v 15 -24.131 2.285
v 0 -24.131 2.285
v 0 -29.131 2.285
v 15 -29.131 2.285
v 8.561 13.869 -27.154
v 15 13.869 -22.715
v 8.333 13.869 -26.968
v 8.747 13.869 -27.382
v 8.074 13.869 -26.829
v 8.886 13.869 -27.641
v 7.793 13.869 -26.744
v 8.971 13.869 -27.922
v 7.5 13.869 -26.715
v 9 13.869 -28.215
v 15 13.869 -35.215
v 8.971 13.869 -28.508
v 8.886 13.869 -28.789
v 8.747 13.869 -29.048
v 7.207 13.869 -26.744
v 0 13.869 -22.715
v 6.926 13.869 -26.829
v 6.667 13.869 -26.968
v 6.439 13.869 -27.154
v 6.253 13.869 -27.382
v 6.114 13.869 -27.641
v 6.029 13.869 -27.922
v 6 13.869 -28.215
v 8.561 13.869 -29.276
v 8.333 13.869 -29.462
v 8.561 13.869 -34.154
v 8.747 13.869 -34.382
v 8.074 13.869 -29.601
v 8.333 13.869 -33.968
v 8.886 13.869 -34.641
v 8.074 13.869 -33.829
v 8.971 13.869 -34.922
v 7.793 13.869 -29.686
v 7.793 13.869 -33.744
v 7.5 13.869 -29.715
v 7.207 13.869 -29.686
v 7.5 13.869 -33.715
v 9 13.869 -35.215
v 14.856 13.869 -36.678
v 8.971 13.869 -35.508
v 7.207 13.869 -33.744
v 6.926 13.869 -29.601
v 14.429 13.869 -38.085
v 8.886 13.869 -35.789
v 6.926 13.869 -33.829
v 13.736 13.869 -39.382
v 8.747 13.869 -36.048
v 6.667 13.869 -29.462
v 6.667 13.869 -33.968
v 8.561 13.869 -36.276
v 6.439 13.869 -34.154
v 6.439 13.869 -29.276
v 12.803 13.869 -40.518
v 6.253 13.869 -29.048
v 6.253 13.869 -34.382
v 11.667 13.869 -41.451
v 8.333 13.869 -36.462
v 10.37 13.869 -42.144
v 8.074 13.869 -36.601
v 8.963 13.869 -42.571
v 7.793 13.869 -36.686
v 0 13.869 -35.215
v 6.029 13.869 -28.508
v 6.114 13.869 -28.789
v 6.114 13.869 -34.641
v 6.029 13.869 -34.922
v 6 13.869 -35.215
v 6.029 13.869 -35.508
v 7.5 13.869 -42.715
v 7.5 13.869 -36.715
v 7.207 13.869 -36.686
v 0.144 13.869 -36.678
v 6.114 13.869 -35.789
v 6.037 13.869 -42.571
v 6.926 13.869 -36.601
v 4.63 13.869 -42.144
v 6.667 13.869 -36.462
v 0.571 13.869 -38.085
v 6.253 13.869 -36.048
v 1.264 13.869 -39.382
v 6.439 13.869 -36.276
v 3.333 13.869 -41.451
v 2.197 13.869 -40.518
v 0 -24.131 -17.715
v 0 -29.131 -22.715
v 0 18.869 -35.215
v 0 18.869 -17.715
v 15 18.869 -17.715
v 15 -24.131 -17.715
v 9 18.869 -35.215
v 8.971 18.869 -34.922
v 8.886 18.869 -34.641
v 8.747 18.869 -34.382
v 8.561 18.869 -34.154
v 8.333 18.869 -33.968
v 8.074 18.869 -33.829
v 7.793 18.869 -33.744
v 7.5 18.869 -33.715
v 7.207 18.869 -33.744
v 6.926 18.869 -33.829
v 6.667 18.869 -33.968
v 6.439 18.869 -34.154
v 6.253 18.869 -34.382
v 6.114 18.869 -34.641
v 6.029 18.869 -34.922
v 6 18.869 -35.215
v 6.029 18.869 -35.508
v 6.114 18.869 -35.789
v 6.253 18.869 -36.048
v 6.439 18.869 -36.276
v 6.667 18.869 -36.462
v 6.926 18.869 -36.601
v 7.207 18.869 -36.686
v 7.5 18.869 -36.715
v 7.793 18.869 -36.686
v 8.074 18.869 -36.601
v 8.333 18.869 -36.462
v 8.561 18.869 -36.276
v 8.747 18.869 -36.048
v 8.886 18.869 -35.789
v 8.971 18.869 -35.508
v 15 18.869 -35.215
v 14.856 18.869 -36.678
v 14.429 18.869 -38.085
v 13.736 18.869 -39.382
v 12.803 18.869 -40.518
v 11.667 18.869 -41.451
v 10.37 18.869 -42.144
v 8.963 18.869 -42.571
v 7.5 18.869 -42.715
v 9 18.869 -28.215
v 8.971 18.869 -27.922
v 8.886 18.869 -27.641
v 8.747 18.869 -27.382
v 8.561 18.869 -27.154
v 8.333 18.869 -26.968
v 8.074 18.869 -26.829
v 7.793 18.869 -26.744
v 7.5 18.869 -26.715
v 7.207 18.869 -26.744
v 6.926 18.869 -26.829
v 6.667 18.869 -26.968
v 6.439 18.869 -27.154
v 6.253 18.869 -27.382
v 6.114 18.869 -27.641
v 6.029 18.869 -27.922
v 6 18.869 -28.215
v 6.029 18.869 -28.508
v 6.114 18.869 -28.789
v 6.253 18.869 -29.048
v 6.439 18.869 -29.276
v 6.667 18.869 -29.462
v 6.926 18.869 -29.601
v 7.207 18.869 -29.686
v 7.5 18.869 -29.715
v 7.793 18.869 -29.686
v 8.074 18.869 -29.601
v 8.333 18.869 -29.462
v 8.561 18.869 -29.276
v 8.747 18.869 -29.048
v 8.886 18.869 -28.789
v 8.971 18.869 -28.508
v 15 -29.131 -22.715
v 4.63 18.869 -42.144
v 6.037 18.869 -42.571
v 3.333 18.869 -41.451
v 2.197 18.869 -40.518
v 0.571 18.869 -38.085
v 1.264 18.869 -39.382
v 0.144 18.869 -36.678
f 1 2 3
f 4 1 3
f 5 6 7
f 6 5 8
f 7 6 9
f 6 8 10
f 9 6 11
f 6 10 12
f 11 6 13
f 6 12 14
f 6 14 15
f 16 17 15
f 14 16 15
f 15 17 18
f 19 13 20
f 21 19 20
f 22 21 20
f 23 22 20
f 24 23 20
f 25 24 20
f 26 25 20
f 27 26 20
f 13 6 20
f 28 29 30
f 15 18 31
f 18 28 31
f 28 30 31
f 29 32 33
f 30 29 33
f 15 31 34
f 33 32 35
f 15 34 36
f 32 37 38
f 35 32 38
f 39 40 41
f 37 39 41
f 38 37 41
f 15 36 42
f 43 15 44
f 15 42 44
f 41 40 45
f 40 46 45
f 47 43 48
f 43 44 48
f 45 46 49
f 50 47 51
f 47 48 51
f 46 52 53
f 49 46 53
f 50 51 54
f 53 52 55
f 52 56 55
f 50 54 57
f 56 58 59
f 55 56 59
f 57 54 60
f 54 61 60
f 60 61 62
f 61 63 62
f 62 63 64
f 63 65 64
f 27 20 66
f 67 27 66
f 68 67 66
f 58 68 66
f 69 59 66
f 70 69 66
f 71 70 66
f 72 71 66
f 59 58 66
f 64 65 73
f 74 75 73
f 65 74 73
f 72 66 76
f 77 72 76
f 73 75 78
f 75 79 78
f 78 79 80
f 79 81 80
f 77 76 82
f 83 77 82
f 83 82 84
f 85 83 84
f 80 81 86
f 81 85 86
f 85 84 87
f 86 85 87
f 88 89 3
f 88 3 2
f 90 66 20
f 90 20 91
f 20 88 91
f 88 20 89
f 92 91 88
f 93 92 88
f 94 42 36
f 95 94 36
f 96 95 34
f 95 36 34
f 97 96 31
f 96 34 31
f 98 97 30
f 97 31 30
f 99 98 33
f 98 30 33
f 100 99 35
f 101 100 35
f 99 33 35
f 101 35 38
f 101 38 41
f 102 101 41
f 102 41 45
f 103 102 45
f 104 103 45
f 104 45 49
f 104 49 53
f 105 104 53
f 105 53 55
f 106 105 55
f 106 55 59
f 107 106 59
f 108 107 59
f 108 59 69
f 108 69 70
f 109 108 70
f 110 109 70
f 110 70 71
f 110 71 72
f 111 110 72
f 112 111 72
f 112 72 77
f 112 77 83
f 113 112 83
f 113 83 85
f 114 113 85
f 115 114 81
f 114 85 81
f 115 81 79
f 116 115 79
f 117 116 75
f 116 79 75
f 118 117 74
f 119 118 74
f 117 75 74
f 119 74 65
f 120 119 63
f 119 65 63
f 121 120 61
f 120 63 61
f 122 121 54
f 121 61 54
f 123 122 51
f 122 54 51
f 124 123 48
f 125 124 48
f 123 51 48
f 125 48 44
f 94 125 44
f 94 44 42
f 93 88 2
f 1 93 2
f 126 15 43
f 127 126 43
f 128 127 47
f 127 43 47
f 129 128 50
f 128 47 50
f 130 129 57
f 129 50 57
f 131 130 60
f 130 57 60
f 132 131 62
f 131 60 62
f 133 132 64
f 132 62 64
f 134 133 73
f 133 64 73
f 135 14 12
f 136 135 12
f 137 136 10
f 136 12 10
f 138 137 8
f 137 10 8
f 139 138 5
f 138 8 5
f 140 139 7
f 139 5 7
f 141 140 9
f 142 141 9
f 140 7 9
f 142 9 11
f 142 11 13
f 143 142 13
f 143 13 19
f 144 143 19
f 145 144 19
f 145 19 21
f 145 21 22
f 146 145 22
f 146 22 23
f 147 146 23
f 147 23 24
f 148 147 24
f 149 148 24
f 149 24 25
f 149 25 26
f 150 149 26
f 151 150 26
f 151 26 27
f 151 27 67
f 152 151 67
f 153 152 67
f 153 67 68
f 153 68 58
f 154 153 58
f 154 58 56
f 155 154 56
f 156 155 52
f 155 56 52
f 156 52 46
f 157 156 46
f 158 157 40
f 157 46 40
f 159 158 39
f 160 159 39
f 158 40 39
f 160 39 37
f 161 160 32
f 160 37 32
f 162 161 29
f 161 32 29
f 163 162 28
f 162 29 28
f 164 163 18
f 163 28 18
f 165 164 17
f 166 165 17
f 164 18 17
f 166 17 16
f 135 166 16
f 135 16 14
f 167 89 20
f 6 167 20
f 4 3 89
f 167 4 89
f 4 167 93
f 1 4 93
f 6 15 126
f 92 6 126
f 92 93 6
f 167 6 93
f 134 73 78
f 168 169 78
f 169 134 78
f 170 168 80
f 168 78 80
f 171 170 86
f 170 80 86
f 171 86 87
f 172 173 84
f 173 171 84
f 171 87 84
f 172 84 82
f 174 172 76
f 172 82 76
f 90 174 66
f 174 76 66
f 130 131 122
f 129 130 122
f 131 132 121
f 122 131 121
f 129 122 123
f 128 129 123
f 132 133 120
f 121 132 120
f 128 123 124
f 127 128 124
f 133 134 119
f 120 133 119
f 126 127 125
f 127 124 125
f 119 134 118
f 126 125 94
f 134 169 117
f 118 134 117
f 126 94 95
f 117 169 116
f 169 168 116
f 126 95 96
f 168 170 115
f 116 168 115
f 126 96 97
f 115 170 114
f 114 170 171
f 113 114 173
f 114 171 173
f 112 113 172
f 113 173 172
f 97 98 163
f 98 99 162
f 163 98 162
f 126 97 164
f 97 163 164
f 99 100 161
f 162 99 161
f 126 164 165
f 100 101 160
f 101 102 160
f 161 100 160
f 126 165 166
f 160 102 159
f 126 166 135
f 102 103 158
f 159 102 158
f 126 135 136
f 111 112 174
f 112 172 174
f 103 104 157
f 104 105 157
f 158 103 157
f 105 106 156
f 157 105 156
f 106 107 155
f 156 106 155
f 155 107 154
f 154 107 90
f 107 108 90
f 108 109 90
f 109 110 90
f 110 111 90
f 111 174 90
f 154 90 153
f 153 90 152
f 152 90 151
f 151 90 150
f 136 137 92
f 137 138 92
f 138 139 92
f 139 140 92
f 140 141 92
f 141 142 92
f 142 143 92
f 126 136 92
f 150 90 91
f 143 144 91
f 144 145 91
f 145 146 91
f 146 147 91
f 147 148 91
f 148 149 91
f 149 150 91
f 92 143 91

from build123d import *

# Parameters (mm, degrees)
F1_DEPTH = 15
F2_R     = 1.5
F3_DEPTH = 5.001


with BuildPart() as f1:
    # F0 (on Right) → F1 (new body)
    with BuildSketch(Plane.YZ):
        Polygon((-24.130502, -17.715111), (-24.130502, 2.284889), (-29.130502, 2.284889), (-29.130502, -22.715111), (13.869498, -22.715111), (13.869498, -42.715111), (18.869498, -42.715111), (18.869498, -17.715111), align=None)
    extrude(amount=F1_DEPTH)

    # F2 (on face) → F3 (cut, through all)
    with BuildSketch(Plane.XZ.offset(-13.869498)):
        with BuildLine():
            ThreePointArc((15, -35.215111), (12.803301, -40.518412), (7.5, -42.715111))
            Line((7.5, -42.715111), (15, -42.715111))
            Line((15, -42.715111), (15, -35.215111))
        make_face()
        with BuildLine():
            ThreePointArc((7.5, -42.715111), (2.196699, -40.518412), (0, -35.215111))
            Line((0, -35.215111), (0, -42.715111))
            Line((0, -42.715111), (7.5, -42.715111))
        make_face()
        with Locations((7.5, -35.215111)):
            Circle(F2_R)
        with Locations((7.5, -28.215111)):
            Circle(F2_R)
    extrude(amount=-F3_DEPTH, mode=Mode.SUBTRACT)


solid = f1.part
